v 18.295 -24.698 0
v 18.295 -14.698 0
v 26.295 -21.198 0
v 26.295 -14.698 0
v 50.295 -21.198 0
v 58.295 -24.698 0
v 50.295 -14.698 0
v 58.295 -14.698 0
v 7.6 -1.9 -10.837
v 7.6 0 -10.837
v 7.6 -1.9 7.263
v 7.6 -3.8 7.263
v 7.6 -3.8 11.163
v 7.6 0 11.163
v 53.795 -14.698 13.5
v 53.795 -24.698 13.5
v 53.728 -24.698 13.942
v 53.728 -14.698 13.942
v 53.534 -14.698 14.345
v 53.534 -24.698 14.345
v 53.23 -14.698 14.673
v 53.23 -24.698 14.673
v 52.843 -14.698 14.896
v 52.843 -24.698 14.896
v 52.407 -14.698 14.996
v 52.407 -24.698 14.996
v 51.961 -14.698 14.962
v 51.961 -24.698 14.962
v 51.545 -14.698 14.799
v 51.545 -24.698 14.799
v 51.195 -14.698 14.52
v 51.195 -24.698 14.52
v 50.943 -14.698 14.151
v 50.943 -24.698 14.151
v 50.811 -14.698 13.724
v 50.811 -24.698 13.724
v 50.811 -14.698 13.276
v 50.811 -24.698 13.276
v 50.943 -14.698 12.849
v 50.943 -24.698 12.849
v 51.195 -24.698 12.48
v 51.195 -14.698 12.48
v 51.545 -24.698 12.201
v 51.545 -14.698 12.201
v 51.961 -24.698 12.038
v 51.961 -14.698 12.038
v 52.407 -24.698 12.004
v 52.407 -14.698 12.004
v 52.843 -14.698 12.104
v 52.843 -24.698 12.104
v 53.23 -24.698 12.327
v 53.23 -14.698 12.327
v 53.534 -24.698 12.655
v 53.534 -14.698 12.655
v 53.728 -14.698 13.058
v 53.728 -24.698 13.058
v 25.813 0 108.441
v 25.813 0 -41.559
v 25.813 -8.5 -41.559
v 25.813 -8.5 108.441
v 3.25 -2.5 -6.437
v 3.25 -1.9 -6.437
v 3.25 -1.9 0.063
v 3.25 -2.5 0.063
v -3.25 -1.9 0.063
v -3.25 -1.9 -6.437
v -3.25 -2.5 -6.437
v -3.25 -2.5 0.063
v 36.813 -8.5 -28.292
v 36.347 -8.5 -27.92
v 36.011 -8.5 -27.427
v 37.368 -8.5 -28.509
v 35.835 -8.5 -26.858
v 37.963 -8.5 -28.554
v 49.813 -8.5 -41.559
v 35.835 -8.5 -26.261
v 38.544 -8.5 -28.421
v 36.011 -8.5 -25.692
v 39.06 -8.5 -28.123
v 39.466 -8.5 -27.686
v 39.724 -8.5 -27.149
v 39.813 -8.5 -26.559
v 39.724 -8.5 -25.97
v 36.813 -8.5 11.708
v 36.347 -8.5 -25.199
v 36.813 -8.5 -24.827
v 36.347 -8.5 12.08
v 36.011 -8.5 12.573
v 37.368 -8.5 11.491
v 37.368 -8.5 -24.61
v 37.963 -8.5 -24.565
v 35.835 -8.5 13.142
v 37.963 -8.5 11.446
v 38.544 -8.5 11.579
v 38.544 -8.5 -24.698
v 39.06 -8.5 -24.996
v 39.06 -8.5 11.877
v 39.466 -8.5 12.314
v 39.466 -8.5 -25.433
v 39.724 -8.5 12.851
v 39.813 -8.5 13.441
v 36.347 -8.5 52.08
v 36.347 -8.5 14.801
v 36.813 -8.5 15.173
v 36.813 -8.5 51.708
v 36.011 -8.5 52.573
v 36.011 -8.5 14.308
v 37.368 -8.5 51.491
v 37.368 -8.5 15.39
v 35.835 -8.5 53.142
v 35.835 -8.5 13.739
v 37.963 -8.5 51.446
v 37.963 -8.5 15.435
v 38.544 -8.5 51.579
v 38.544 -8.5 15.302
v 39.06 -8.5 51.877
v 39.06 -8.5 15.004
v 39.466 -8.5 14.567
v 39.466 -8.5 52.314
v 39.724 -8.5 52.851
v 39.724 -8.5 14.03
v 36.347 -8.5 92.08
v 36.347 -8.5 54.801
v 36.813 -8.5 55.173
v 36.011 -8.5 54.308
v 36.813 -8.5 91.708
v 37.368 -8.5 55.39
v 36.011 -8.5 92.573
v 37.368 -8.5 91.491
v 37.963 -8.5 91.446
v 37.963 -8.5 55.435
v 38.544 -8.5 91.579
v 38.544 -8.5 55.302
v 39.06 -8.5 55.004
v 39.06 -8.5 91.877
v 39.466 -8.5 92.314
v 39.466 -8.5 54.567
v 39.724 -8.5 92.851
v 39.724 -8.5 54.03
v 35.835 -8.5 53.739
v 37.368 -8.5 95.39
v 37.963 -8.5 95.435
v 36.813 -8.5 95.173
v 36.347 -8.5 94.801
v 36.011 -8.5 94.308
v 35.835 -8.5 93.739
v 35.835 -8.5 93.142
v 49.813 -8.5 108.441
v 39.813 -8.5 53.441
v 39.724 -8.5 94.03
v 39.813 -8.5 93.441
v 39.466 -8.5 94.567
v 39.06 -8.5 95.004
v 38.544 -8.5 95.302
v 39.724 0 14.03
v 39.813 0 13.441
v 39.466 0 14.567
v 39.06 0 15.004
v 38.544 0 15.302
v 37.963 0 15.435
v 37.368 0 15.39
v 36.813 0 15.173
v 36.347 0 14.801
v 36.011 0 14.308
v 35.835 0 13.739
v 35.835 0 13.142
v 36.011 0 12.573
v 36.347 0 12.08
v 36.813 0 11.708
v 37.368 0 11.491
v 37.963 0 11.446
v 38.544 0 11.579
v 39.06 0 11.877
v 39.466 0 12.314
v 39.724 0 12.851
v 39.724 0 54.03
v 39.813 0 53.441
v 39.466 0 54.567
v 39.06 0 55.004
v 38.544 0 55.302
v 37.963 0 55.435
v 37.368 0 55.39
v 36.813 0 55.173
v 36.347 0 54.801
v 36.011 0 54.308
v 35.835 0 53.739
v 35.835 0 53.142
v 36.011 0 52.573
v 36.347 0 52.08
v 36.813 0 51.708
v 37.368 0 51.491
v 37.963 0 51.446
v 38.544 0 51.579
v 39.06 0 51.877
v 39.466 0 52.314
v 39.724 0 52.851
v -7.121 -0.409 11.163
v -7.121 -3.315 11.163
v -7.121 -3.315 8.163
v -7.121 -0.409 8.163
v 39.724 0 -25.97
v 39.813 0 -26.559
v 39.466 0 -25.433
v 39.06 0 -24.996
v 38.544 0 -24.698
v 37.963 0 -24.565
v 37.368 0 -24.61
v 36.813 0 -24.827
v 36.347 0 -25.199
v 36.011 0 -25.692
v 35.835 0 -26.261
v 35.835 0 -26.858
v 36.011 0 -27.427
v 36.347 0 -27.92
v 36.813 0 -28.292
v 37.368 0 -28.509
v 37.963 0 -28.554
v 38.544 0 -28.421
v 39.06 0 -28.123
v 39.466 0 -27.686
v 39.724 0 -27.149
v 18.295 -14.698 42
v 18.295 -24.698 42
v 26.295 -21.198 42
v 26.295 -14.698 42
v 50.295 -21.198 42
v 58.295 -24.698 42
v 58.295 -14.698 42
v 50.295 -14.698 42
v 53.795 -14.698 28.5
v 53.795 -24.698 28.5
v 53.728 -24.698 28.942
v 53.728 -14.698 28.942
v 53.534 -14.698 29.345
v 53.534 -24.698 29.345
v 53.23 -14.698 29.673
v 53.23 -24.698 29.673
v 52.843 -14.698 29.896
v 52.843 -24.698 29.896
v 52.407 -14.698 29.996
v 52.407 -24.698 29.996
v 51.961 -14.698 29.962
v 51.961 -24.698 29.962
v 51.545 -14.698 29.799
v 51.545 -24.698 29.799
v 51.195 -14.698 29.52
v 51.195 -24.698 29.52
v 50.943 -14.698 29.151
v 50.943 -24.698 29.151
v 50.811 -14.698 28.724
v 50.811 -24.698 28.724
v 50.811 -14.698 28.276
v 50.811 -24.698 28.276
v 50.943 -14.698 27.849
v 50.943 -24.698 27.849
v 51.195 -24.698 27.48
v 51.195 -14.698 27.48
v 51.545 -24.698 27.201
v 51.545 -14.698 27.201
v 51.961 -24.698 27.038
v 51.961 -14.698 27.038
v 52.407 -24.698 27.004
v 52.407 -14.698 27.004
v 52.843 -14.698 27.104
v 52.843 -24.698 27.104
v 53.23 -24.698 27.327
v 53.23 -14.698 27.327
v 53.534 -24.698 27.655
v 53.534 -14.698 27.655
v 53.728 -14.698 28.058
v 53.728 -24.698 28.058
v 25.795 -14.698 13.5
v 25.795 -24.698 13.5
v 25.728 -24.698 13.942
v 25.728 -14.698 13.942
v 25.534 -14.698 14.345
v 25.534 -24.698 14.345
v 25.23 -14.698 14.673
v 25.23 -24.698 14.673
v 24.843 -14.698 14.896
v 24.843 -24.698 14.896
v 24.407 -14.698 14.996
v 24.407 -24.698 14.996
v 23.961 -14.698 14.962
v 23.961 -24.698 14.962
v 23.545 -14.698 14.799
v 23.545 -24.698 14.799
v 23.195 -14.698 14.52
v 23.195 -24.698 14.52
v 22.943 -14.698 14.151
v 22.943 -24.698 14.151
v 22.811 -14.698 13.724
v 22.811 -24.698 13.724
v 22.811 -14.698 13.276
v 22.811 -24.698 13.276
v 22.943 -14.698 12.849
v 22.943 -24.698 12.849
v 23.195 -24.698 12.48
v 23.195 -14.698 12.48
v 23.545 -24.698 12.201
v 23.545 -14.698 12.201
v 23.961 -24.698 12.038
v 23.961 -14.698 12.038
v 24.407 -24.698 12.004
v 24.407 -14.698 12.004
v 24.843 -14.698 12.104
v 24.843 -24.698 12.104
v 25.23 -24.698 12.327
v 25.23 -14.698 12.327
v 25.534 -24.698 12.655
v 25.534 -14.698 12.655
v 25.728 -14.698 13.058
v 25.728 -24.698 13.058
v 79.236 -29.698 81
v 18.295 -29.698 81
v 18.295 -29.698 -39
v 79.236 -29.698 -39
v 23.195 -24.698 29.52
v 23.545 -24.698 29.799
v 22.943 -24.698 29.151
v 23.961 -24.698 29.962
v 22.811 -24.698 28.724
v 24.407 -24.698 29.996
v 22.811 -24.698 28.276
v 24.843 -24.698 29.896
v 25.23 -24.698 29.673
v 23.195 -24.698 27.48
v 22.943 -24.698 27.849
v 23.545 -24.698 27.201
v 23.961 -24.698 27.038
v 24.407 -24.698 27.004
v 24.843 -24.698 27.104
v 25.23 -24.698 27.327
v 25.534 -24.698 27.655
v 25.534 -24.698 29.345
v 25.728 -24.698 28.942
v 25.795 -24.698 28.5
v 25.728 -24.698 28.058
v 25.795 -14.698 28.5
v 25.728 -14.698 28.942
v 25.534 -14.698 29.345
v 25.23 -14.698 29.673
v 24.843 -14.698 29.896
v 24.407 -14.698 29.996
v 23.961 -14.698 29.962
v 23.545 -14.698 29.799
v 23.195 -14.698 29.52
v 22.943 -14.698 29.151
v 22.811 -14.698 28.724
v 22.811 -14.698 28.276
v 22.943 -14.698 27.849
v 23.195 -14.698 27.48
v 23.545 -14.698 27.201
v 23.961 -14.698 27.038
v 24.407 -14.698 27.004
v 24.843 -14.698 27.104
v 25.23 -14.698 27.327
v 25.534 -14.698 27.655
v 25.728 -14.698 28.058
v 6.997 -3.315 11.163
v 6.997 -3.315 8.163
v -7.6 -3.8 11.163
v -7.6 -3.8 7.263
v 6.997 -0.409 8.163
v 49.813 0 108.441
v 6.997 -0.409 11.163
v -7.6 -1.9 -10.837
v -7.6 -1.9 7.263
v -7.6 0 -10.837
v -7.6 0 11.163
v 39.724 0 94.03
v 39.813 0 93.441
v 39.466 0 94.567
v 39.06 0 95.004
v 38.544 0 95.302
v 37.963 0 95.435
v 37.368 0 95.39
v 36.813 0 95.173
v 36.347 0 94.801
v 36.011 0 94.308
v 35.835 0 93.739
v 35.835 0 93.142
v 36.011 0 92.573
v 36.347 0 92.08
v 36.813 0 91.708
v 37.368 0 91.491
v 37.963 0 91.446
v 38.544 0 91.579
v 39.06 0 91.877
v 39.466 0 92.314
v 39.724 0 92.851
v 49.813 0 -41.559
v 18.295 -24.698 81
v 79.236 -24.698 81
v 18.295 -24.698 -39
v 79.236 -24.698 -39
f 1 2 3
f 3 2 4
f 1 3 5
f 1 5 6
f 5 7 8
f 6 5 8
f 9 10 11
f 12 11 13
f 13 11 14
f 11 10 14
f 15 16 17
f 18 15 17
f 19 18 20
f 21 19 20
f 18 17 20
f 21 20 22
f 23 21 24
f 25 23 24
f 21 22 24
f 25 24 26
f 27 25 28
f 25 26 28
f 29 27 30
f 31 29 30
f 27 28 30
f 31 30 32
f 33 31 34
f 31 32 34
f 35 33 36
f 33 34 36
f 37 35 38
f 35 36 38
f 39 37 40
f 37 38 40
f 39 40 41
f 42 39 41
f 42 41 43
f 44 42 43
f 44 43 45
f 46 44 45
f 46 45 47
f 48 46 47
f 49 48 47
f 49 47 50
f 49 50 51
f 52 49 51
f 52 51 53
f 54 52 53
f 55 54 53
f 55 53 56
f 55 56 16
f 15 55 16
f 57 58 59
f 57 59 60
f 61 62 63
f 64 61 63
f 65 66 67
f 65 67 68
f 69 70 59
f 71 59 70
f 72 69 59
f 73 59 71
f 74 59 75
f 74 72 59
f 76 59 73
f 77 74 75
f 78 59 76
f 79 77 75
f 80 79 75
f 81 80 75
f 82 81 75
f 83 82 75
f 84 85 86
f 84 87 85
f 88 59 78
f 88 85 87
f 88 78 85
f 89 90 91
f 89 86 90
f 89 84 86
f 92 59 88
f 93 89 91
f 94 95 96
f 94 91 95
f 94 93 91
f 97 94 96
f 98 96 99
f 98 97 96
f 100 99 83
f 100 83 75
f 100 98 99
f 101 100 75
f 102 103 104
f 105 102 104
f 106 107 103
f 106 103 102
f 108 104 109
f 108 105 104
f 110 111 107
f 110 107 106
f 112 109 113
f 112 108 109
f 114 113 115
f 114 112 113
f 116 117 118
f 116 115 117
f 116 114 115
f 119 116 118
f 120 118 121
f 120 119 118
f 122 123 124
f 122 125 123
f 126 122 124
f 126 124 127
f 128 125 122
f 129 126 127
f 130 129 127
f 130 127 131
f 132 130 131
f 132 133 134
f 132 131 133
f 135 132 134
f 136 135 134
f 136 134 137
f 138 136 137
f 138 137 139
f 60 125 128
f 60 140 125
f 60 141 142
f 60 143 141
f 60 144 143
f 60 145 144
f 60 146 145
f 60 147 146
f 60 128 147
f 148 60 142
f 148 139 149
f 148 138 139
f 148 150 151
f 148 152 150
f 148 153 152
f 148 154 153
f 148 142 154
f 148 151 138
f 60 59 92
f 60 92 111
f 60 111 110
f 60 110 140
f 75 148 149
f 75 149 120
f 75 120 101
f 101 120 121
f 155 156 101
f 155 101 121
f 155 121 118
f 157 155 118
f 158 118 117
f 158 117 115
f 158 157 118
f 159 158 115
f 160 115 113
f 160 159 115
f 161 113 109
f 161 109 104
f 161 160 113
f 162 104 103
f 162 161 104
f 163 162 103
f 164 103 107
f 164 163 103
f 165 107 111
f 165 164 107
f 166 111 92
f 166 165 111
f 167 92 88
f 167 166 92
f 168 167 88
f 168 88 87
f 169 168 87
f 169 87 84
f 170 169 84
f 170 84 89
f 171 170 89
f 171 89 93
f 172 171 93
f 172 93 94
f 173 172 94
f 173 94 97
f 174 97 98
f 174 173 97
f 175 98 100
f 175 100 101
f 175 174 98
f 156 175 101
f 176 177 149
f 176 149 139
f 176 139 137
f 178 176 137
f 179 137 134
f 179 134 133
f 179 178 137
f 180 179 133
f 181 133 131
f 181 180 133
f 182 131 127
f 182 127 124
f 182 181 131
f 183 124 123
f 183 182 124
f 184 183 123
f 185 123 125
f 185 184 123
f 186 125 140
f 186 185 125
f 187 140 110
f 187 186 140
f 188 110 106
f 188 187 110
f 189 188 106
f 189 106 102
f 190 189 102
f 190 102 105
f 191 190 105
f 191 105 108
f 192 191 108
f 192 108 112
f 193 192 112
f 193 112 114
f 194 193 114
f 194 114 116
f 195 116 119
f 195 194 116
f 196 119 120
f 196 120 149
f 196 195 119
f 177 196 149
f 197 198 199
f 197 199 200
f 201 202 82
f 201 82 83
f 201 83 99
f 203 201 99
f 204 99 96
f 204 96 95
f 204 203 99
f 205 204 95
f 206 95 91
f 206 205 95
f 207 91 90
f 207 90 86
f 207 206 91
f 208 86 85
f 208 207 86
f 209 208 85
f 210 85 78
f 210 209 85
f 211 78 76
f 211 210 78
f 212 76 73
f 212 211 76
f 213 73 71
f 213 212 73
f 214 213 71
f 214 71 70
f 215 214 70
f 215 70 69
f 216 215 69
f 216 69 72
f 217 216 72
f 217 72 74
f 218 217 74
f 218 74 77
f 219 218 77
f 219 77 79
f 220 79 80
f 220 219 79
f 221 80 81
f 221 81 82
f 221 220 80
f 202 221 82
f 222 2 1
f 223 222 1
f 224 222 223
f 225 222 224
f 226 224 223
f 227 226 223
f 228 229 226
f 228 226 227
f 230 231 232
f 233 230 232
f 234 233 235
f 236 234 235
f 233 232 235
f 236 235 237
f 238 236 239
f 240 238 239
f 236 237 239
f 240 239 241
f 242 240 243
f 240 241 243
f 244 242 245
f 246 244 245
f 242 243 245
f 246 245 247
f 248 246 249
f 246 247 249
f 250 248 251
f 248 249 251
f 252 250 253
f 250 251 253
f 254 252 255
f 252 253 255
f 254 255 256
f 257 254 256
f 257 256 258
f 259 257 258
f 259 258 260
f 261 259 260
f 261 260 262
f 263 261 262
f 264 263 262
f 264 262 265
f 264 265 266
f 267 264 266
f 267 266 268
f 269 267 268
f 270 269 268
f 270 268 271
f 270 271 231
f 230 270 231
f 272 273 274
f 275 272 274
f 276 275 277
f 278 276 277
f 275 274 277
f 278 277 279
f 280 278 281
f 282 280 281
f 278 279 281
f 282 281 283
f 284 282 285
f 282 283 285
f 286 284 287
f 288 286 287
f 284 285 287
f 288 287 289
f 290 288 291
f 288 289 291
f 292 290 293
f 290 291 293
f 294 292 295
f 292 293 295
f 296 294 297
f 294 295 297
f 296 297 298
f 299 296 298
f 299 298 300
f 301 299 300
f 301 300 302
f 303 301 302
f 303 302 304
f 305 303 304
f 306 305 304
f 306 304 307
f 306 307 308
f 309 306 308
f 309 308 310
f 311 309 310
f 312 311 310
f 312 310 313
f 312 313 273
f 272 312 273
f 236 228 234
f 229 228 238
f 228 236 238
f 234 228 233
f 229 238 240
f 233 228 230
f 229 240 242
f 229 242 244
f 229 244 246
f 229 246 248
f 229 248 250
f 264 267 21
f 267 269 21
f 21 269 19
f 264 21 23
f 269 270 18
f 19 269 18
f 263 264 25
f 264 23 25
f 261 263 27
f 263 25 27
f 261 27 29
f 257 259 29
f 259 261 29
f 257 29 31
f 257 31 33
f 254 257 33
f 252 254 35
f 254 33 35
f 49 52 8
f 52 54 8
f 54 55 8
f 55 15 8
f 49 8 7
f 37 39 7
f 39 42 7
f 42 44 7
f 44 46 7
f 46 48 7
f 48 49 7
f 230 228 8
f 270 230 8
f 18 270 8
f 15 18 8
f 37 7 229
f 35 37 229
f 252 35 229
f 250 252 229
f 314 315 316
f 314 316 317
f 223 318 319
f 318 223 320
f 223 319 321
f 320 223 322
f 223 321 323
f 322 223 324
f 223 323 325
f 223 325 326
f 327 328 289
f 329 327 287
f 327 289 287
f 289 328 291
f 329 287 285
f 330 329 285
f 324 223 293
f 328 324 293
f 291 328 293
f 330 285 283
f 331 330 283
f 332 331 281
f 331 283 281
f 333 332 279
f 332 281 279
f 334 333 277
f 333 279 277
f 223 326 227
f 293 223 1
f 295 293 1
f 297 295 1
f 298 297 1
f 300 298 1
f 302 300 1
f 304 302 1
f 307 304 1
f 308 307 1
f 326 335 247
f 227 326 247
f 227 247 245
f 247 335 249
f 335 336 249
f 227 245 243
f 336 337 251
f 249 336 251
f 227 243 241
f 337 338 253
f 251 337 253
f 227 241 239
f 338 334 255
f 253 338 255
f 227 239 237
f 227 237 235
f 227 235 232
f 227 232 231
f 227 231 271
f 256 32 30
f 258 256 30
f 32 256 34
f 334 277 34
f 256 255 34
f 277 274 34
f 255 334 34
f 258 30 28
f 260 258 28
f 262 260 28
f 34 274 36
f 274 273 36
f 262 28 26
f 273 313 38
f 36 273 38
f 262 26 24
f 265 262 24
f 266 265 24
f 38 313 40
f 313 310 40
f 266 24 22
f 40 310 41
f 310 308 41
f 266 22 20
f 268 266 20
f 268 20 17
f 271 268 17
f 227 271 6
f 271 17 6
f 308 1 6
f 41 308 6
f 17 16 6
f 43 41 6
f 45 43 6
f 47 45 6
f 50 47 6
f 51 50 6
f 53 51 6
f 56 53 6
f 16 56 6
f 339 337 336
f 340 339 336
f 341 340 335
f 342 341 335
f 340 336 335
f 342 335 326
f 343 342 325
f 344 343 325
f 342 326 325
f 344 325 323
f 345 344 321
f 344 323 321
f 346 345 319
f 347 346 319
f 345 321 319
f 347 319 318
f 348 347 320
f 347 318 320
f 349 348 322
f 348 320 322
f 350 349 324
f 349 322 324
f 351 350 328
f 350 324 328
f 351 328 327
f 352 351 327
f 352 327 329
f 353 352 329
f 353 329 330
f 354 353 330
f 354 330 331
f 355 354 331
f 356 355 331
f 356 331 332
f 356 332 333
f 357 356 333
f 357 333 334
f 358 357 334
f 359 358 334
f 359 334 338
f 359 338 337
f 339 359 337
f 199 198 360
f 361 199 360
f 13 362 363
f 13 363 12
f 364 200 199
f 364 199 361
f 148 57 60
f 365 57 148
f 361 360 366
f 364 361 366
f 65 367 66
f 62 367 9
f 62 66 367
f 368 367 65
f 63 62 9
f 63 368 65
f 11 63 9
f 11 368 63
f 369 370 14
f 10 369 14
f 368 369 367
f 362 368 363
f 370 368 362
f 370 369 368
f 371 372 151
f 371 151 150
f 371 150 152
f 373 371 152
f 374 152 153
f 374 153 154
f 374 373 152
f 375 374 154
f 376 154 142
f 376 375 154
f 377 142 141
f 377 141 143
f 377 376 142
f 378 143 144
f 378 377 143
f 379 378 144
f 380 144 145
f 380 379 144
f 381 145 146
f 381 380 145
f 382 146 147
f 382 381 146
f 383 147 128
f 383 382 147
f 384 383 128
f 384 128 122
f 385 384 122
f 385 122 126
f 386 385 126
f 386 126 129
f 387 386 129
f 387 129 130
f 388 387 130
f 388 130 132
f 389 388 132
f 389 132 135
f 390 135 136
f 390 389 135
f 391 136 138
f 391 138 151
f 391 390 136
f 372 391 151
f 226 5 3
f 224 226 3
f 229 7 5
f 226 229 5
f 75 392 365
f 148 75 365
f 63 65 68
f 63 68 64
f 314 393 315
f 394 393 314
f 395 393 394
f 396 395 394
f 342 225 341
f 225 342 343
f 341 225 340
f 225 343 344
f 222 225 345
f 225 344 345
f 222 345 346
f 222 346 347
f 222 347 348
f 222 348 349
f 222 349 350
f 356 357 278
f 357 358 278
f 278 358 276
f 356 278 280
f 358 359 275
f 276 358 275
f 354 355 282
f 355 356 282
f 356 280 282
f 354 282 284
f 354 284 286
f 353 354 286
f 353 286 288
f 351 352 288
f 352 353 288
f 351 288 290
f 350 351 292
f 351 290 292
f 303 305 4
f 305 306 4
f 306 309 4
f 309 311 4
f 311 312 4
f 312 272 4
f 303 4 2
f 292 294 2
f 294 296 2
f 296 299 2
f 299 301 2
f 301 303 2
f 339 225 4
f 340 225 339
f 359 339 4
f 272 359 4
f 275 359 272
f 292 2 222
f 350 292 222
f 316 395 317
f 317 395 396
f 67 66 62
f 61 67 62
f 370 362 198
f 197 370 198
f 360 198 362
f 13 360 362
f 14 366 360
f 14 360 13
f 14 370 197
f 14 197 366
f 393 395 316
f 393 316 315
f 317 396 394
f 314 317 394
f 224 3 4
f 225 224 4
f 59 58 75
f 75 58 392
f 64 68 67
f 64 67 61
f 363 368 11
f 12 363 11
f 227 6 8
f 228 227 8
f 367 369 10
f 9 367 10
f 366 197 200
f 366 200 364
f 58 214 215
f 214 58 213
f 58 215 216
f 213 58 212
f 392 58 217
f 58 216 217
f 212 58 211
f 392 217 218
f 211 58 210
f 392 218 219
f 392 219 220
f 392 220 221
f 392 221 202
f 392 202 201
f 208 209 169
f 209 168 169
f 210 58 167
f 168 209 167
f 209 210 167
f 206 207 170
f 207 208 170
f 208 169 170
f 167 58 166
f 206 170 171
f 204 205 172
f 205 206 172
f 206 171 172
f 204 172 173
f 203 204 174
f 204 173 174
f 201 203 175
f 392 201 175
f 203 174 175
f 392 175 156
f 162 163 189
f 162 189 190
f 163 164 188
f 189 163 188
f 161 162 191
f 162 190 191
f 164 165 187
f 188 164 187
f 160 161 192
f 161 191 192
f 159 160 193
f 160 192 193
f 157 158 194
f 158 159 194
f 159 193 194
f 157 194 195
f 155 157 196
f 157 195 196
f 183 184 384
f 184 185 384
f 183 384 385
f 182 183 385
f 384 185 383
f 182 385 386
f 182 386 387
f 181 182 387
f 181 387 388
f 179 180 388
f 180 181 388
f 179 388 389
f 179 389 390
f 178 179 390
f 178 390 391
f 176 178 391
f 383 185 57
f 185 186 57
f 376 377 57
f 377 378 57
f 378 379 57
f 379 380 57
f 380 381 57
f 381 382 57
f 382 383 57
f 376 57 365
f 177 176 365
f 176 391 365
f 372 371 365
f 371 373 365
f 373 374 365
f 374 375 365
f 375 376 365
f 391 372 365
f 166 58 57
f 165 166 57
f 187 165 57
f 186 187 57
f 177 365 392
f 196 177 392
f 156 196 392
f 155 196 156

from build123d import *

# Parameters (mm, degrees)
F0_W      = 15.2
F0_H      = 22
F1_DEPTH  = 1.9
F2_W      = 15.2
F2_H      = 3.9
F3_DEPTH  = 1.9
F4_W      = 6.5
F4_H      = 6.5
F5_DEPTH  = 0.6
F6_W      = 14.117376
F6_H      = 2.906029
F7_DEPTH  = 3
F8_W      = 24
F8_H      = 150
F8_R      = 2
F9_DEPTH  = 8.5
F11_DEPTH = 42
F12_R     = 1.5
F13_DEPTH = 25
F14_W     = 60.94168
F14_H     = 120
F15_DEPTH = 5


with BuildPart() as f1:
    # F0 (on Front) → F1 (new body)
    with BuildSketch(Plane.XZ):
        with Locations((0, 0.162964)):
            Rectangle(F0_W, F0_H)
    extrude(amount=F1_DEPTH)

    # F2 (on face) → F3 (join)
    with BuildSketch(Plane.XZ.offset(1.9)):
        with Locations((0, 9.212964)):
            Rectangle(F2_W, F2_H)
    extrude(amount=F3_DEPTH)

    # F4 (on face) → F5 (join)
    with BuildSketch(Plane.XZ.offset(1.9)):
        with Locations((0, -3.187036)):
            Rectangle(F4_W, F4_H)
    extrude(amount=F5_DEPTH)

    # F6 (on face) → F7 (cut)
    with BuildSketch(Plane.XY.offset(11.162964)):
        with Locations((-0.06202, -1.861931)):
            Rectangle(F6_W, F6_H)
    extrude(amount=-F7_DEPTH, mode=Mode.SUBTRACT)


with BuildPart() as f9:
    # F8 (on Front) → F9 (new body)
    with BuildSketch(Plane.XZ):
        with Locations((37.813129, 33.440546)):
            Rectangle(F8_W, F8_H)
        with Locations((37.813129, -26.559454)):
            Circle(F8_R, mode=Mode.SUBTRACT)
        with Locations((37.813129, 13.440546)):
            Circle(F8_R, mode=Mode.SUBTRACT)
        with Locations((37.813129, 93.440546)):
            Circle(F8_R, mode=Mode.SUBTRACT)
        with Locations((37.813129, 53.440546)):
            Circle(F8_R, mode=Mode.SUBTRACT)
    extrude(amount=F9_DEPTH)


with BuildPart() as f11:
    # F10 (on Top) → F11 (new body)
    with BuildSketch(Plane.XY):
        Polygon((50.294616, -21.19773), (38.294616, -21.19773), (26.294616, -21.19773), (26.294616, -14.69773), (18.294616, -14.69773), (18.294616, -24.69773), (38.294616, -24.69773), (58.294616, -24.69773), (58.294616, -14.69773), (50.294616, -14.69773), align=None)
    extrude(amount=F11_DEPTH)

    # F12 (on face) → F13 (cut)
    with BuildSketch(Plane.XZ.offset(24.69773)):
        with Locations((24.294616, 28.5)):
            Circle(F12_R)
        with Locations((52.294616, 28.5)):
            Circle(F12_R)
        with Locations((52.294616, 13.5)):
            Circle(F12_R)
        with Locations((24.294616, 13.5)):
            Circle(F12_R)
    extrude(amount=-F13_DEPTH, mode=Mode.SUBTRACT)


with BuildPart() as f15:
    # F14 (on face) → F15 (new body)
    with BuildSketch(Plane.XZ.offset(24.69773)):
        with Locations((48.765456, 21)):
            Rectangle(F14_W, F14_H)
    extrude(amount=F15_DEPTH)


solid = Compound([f1.part, f9.part, f11.part, f15.part])
